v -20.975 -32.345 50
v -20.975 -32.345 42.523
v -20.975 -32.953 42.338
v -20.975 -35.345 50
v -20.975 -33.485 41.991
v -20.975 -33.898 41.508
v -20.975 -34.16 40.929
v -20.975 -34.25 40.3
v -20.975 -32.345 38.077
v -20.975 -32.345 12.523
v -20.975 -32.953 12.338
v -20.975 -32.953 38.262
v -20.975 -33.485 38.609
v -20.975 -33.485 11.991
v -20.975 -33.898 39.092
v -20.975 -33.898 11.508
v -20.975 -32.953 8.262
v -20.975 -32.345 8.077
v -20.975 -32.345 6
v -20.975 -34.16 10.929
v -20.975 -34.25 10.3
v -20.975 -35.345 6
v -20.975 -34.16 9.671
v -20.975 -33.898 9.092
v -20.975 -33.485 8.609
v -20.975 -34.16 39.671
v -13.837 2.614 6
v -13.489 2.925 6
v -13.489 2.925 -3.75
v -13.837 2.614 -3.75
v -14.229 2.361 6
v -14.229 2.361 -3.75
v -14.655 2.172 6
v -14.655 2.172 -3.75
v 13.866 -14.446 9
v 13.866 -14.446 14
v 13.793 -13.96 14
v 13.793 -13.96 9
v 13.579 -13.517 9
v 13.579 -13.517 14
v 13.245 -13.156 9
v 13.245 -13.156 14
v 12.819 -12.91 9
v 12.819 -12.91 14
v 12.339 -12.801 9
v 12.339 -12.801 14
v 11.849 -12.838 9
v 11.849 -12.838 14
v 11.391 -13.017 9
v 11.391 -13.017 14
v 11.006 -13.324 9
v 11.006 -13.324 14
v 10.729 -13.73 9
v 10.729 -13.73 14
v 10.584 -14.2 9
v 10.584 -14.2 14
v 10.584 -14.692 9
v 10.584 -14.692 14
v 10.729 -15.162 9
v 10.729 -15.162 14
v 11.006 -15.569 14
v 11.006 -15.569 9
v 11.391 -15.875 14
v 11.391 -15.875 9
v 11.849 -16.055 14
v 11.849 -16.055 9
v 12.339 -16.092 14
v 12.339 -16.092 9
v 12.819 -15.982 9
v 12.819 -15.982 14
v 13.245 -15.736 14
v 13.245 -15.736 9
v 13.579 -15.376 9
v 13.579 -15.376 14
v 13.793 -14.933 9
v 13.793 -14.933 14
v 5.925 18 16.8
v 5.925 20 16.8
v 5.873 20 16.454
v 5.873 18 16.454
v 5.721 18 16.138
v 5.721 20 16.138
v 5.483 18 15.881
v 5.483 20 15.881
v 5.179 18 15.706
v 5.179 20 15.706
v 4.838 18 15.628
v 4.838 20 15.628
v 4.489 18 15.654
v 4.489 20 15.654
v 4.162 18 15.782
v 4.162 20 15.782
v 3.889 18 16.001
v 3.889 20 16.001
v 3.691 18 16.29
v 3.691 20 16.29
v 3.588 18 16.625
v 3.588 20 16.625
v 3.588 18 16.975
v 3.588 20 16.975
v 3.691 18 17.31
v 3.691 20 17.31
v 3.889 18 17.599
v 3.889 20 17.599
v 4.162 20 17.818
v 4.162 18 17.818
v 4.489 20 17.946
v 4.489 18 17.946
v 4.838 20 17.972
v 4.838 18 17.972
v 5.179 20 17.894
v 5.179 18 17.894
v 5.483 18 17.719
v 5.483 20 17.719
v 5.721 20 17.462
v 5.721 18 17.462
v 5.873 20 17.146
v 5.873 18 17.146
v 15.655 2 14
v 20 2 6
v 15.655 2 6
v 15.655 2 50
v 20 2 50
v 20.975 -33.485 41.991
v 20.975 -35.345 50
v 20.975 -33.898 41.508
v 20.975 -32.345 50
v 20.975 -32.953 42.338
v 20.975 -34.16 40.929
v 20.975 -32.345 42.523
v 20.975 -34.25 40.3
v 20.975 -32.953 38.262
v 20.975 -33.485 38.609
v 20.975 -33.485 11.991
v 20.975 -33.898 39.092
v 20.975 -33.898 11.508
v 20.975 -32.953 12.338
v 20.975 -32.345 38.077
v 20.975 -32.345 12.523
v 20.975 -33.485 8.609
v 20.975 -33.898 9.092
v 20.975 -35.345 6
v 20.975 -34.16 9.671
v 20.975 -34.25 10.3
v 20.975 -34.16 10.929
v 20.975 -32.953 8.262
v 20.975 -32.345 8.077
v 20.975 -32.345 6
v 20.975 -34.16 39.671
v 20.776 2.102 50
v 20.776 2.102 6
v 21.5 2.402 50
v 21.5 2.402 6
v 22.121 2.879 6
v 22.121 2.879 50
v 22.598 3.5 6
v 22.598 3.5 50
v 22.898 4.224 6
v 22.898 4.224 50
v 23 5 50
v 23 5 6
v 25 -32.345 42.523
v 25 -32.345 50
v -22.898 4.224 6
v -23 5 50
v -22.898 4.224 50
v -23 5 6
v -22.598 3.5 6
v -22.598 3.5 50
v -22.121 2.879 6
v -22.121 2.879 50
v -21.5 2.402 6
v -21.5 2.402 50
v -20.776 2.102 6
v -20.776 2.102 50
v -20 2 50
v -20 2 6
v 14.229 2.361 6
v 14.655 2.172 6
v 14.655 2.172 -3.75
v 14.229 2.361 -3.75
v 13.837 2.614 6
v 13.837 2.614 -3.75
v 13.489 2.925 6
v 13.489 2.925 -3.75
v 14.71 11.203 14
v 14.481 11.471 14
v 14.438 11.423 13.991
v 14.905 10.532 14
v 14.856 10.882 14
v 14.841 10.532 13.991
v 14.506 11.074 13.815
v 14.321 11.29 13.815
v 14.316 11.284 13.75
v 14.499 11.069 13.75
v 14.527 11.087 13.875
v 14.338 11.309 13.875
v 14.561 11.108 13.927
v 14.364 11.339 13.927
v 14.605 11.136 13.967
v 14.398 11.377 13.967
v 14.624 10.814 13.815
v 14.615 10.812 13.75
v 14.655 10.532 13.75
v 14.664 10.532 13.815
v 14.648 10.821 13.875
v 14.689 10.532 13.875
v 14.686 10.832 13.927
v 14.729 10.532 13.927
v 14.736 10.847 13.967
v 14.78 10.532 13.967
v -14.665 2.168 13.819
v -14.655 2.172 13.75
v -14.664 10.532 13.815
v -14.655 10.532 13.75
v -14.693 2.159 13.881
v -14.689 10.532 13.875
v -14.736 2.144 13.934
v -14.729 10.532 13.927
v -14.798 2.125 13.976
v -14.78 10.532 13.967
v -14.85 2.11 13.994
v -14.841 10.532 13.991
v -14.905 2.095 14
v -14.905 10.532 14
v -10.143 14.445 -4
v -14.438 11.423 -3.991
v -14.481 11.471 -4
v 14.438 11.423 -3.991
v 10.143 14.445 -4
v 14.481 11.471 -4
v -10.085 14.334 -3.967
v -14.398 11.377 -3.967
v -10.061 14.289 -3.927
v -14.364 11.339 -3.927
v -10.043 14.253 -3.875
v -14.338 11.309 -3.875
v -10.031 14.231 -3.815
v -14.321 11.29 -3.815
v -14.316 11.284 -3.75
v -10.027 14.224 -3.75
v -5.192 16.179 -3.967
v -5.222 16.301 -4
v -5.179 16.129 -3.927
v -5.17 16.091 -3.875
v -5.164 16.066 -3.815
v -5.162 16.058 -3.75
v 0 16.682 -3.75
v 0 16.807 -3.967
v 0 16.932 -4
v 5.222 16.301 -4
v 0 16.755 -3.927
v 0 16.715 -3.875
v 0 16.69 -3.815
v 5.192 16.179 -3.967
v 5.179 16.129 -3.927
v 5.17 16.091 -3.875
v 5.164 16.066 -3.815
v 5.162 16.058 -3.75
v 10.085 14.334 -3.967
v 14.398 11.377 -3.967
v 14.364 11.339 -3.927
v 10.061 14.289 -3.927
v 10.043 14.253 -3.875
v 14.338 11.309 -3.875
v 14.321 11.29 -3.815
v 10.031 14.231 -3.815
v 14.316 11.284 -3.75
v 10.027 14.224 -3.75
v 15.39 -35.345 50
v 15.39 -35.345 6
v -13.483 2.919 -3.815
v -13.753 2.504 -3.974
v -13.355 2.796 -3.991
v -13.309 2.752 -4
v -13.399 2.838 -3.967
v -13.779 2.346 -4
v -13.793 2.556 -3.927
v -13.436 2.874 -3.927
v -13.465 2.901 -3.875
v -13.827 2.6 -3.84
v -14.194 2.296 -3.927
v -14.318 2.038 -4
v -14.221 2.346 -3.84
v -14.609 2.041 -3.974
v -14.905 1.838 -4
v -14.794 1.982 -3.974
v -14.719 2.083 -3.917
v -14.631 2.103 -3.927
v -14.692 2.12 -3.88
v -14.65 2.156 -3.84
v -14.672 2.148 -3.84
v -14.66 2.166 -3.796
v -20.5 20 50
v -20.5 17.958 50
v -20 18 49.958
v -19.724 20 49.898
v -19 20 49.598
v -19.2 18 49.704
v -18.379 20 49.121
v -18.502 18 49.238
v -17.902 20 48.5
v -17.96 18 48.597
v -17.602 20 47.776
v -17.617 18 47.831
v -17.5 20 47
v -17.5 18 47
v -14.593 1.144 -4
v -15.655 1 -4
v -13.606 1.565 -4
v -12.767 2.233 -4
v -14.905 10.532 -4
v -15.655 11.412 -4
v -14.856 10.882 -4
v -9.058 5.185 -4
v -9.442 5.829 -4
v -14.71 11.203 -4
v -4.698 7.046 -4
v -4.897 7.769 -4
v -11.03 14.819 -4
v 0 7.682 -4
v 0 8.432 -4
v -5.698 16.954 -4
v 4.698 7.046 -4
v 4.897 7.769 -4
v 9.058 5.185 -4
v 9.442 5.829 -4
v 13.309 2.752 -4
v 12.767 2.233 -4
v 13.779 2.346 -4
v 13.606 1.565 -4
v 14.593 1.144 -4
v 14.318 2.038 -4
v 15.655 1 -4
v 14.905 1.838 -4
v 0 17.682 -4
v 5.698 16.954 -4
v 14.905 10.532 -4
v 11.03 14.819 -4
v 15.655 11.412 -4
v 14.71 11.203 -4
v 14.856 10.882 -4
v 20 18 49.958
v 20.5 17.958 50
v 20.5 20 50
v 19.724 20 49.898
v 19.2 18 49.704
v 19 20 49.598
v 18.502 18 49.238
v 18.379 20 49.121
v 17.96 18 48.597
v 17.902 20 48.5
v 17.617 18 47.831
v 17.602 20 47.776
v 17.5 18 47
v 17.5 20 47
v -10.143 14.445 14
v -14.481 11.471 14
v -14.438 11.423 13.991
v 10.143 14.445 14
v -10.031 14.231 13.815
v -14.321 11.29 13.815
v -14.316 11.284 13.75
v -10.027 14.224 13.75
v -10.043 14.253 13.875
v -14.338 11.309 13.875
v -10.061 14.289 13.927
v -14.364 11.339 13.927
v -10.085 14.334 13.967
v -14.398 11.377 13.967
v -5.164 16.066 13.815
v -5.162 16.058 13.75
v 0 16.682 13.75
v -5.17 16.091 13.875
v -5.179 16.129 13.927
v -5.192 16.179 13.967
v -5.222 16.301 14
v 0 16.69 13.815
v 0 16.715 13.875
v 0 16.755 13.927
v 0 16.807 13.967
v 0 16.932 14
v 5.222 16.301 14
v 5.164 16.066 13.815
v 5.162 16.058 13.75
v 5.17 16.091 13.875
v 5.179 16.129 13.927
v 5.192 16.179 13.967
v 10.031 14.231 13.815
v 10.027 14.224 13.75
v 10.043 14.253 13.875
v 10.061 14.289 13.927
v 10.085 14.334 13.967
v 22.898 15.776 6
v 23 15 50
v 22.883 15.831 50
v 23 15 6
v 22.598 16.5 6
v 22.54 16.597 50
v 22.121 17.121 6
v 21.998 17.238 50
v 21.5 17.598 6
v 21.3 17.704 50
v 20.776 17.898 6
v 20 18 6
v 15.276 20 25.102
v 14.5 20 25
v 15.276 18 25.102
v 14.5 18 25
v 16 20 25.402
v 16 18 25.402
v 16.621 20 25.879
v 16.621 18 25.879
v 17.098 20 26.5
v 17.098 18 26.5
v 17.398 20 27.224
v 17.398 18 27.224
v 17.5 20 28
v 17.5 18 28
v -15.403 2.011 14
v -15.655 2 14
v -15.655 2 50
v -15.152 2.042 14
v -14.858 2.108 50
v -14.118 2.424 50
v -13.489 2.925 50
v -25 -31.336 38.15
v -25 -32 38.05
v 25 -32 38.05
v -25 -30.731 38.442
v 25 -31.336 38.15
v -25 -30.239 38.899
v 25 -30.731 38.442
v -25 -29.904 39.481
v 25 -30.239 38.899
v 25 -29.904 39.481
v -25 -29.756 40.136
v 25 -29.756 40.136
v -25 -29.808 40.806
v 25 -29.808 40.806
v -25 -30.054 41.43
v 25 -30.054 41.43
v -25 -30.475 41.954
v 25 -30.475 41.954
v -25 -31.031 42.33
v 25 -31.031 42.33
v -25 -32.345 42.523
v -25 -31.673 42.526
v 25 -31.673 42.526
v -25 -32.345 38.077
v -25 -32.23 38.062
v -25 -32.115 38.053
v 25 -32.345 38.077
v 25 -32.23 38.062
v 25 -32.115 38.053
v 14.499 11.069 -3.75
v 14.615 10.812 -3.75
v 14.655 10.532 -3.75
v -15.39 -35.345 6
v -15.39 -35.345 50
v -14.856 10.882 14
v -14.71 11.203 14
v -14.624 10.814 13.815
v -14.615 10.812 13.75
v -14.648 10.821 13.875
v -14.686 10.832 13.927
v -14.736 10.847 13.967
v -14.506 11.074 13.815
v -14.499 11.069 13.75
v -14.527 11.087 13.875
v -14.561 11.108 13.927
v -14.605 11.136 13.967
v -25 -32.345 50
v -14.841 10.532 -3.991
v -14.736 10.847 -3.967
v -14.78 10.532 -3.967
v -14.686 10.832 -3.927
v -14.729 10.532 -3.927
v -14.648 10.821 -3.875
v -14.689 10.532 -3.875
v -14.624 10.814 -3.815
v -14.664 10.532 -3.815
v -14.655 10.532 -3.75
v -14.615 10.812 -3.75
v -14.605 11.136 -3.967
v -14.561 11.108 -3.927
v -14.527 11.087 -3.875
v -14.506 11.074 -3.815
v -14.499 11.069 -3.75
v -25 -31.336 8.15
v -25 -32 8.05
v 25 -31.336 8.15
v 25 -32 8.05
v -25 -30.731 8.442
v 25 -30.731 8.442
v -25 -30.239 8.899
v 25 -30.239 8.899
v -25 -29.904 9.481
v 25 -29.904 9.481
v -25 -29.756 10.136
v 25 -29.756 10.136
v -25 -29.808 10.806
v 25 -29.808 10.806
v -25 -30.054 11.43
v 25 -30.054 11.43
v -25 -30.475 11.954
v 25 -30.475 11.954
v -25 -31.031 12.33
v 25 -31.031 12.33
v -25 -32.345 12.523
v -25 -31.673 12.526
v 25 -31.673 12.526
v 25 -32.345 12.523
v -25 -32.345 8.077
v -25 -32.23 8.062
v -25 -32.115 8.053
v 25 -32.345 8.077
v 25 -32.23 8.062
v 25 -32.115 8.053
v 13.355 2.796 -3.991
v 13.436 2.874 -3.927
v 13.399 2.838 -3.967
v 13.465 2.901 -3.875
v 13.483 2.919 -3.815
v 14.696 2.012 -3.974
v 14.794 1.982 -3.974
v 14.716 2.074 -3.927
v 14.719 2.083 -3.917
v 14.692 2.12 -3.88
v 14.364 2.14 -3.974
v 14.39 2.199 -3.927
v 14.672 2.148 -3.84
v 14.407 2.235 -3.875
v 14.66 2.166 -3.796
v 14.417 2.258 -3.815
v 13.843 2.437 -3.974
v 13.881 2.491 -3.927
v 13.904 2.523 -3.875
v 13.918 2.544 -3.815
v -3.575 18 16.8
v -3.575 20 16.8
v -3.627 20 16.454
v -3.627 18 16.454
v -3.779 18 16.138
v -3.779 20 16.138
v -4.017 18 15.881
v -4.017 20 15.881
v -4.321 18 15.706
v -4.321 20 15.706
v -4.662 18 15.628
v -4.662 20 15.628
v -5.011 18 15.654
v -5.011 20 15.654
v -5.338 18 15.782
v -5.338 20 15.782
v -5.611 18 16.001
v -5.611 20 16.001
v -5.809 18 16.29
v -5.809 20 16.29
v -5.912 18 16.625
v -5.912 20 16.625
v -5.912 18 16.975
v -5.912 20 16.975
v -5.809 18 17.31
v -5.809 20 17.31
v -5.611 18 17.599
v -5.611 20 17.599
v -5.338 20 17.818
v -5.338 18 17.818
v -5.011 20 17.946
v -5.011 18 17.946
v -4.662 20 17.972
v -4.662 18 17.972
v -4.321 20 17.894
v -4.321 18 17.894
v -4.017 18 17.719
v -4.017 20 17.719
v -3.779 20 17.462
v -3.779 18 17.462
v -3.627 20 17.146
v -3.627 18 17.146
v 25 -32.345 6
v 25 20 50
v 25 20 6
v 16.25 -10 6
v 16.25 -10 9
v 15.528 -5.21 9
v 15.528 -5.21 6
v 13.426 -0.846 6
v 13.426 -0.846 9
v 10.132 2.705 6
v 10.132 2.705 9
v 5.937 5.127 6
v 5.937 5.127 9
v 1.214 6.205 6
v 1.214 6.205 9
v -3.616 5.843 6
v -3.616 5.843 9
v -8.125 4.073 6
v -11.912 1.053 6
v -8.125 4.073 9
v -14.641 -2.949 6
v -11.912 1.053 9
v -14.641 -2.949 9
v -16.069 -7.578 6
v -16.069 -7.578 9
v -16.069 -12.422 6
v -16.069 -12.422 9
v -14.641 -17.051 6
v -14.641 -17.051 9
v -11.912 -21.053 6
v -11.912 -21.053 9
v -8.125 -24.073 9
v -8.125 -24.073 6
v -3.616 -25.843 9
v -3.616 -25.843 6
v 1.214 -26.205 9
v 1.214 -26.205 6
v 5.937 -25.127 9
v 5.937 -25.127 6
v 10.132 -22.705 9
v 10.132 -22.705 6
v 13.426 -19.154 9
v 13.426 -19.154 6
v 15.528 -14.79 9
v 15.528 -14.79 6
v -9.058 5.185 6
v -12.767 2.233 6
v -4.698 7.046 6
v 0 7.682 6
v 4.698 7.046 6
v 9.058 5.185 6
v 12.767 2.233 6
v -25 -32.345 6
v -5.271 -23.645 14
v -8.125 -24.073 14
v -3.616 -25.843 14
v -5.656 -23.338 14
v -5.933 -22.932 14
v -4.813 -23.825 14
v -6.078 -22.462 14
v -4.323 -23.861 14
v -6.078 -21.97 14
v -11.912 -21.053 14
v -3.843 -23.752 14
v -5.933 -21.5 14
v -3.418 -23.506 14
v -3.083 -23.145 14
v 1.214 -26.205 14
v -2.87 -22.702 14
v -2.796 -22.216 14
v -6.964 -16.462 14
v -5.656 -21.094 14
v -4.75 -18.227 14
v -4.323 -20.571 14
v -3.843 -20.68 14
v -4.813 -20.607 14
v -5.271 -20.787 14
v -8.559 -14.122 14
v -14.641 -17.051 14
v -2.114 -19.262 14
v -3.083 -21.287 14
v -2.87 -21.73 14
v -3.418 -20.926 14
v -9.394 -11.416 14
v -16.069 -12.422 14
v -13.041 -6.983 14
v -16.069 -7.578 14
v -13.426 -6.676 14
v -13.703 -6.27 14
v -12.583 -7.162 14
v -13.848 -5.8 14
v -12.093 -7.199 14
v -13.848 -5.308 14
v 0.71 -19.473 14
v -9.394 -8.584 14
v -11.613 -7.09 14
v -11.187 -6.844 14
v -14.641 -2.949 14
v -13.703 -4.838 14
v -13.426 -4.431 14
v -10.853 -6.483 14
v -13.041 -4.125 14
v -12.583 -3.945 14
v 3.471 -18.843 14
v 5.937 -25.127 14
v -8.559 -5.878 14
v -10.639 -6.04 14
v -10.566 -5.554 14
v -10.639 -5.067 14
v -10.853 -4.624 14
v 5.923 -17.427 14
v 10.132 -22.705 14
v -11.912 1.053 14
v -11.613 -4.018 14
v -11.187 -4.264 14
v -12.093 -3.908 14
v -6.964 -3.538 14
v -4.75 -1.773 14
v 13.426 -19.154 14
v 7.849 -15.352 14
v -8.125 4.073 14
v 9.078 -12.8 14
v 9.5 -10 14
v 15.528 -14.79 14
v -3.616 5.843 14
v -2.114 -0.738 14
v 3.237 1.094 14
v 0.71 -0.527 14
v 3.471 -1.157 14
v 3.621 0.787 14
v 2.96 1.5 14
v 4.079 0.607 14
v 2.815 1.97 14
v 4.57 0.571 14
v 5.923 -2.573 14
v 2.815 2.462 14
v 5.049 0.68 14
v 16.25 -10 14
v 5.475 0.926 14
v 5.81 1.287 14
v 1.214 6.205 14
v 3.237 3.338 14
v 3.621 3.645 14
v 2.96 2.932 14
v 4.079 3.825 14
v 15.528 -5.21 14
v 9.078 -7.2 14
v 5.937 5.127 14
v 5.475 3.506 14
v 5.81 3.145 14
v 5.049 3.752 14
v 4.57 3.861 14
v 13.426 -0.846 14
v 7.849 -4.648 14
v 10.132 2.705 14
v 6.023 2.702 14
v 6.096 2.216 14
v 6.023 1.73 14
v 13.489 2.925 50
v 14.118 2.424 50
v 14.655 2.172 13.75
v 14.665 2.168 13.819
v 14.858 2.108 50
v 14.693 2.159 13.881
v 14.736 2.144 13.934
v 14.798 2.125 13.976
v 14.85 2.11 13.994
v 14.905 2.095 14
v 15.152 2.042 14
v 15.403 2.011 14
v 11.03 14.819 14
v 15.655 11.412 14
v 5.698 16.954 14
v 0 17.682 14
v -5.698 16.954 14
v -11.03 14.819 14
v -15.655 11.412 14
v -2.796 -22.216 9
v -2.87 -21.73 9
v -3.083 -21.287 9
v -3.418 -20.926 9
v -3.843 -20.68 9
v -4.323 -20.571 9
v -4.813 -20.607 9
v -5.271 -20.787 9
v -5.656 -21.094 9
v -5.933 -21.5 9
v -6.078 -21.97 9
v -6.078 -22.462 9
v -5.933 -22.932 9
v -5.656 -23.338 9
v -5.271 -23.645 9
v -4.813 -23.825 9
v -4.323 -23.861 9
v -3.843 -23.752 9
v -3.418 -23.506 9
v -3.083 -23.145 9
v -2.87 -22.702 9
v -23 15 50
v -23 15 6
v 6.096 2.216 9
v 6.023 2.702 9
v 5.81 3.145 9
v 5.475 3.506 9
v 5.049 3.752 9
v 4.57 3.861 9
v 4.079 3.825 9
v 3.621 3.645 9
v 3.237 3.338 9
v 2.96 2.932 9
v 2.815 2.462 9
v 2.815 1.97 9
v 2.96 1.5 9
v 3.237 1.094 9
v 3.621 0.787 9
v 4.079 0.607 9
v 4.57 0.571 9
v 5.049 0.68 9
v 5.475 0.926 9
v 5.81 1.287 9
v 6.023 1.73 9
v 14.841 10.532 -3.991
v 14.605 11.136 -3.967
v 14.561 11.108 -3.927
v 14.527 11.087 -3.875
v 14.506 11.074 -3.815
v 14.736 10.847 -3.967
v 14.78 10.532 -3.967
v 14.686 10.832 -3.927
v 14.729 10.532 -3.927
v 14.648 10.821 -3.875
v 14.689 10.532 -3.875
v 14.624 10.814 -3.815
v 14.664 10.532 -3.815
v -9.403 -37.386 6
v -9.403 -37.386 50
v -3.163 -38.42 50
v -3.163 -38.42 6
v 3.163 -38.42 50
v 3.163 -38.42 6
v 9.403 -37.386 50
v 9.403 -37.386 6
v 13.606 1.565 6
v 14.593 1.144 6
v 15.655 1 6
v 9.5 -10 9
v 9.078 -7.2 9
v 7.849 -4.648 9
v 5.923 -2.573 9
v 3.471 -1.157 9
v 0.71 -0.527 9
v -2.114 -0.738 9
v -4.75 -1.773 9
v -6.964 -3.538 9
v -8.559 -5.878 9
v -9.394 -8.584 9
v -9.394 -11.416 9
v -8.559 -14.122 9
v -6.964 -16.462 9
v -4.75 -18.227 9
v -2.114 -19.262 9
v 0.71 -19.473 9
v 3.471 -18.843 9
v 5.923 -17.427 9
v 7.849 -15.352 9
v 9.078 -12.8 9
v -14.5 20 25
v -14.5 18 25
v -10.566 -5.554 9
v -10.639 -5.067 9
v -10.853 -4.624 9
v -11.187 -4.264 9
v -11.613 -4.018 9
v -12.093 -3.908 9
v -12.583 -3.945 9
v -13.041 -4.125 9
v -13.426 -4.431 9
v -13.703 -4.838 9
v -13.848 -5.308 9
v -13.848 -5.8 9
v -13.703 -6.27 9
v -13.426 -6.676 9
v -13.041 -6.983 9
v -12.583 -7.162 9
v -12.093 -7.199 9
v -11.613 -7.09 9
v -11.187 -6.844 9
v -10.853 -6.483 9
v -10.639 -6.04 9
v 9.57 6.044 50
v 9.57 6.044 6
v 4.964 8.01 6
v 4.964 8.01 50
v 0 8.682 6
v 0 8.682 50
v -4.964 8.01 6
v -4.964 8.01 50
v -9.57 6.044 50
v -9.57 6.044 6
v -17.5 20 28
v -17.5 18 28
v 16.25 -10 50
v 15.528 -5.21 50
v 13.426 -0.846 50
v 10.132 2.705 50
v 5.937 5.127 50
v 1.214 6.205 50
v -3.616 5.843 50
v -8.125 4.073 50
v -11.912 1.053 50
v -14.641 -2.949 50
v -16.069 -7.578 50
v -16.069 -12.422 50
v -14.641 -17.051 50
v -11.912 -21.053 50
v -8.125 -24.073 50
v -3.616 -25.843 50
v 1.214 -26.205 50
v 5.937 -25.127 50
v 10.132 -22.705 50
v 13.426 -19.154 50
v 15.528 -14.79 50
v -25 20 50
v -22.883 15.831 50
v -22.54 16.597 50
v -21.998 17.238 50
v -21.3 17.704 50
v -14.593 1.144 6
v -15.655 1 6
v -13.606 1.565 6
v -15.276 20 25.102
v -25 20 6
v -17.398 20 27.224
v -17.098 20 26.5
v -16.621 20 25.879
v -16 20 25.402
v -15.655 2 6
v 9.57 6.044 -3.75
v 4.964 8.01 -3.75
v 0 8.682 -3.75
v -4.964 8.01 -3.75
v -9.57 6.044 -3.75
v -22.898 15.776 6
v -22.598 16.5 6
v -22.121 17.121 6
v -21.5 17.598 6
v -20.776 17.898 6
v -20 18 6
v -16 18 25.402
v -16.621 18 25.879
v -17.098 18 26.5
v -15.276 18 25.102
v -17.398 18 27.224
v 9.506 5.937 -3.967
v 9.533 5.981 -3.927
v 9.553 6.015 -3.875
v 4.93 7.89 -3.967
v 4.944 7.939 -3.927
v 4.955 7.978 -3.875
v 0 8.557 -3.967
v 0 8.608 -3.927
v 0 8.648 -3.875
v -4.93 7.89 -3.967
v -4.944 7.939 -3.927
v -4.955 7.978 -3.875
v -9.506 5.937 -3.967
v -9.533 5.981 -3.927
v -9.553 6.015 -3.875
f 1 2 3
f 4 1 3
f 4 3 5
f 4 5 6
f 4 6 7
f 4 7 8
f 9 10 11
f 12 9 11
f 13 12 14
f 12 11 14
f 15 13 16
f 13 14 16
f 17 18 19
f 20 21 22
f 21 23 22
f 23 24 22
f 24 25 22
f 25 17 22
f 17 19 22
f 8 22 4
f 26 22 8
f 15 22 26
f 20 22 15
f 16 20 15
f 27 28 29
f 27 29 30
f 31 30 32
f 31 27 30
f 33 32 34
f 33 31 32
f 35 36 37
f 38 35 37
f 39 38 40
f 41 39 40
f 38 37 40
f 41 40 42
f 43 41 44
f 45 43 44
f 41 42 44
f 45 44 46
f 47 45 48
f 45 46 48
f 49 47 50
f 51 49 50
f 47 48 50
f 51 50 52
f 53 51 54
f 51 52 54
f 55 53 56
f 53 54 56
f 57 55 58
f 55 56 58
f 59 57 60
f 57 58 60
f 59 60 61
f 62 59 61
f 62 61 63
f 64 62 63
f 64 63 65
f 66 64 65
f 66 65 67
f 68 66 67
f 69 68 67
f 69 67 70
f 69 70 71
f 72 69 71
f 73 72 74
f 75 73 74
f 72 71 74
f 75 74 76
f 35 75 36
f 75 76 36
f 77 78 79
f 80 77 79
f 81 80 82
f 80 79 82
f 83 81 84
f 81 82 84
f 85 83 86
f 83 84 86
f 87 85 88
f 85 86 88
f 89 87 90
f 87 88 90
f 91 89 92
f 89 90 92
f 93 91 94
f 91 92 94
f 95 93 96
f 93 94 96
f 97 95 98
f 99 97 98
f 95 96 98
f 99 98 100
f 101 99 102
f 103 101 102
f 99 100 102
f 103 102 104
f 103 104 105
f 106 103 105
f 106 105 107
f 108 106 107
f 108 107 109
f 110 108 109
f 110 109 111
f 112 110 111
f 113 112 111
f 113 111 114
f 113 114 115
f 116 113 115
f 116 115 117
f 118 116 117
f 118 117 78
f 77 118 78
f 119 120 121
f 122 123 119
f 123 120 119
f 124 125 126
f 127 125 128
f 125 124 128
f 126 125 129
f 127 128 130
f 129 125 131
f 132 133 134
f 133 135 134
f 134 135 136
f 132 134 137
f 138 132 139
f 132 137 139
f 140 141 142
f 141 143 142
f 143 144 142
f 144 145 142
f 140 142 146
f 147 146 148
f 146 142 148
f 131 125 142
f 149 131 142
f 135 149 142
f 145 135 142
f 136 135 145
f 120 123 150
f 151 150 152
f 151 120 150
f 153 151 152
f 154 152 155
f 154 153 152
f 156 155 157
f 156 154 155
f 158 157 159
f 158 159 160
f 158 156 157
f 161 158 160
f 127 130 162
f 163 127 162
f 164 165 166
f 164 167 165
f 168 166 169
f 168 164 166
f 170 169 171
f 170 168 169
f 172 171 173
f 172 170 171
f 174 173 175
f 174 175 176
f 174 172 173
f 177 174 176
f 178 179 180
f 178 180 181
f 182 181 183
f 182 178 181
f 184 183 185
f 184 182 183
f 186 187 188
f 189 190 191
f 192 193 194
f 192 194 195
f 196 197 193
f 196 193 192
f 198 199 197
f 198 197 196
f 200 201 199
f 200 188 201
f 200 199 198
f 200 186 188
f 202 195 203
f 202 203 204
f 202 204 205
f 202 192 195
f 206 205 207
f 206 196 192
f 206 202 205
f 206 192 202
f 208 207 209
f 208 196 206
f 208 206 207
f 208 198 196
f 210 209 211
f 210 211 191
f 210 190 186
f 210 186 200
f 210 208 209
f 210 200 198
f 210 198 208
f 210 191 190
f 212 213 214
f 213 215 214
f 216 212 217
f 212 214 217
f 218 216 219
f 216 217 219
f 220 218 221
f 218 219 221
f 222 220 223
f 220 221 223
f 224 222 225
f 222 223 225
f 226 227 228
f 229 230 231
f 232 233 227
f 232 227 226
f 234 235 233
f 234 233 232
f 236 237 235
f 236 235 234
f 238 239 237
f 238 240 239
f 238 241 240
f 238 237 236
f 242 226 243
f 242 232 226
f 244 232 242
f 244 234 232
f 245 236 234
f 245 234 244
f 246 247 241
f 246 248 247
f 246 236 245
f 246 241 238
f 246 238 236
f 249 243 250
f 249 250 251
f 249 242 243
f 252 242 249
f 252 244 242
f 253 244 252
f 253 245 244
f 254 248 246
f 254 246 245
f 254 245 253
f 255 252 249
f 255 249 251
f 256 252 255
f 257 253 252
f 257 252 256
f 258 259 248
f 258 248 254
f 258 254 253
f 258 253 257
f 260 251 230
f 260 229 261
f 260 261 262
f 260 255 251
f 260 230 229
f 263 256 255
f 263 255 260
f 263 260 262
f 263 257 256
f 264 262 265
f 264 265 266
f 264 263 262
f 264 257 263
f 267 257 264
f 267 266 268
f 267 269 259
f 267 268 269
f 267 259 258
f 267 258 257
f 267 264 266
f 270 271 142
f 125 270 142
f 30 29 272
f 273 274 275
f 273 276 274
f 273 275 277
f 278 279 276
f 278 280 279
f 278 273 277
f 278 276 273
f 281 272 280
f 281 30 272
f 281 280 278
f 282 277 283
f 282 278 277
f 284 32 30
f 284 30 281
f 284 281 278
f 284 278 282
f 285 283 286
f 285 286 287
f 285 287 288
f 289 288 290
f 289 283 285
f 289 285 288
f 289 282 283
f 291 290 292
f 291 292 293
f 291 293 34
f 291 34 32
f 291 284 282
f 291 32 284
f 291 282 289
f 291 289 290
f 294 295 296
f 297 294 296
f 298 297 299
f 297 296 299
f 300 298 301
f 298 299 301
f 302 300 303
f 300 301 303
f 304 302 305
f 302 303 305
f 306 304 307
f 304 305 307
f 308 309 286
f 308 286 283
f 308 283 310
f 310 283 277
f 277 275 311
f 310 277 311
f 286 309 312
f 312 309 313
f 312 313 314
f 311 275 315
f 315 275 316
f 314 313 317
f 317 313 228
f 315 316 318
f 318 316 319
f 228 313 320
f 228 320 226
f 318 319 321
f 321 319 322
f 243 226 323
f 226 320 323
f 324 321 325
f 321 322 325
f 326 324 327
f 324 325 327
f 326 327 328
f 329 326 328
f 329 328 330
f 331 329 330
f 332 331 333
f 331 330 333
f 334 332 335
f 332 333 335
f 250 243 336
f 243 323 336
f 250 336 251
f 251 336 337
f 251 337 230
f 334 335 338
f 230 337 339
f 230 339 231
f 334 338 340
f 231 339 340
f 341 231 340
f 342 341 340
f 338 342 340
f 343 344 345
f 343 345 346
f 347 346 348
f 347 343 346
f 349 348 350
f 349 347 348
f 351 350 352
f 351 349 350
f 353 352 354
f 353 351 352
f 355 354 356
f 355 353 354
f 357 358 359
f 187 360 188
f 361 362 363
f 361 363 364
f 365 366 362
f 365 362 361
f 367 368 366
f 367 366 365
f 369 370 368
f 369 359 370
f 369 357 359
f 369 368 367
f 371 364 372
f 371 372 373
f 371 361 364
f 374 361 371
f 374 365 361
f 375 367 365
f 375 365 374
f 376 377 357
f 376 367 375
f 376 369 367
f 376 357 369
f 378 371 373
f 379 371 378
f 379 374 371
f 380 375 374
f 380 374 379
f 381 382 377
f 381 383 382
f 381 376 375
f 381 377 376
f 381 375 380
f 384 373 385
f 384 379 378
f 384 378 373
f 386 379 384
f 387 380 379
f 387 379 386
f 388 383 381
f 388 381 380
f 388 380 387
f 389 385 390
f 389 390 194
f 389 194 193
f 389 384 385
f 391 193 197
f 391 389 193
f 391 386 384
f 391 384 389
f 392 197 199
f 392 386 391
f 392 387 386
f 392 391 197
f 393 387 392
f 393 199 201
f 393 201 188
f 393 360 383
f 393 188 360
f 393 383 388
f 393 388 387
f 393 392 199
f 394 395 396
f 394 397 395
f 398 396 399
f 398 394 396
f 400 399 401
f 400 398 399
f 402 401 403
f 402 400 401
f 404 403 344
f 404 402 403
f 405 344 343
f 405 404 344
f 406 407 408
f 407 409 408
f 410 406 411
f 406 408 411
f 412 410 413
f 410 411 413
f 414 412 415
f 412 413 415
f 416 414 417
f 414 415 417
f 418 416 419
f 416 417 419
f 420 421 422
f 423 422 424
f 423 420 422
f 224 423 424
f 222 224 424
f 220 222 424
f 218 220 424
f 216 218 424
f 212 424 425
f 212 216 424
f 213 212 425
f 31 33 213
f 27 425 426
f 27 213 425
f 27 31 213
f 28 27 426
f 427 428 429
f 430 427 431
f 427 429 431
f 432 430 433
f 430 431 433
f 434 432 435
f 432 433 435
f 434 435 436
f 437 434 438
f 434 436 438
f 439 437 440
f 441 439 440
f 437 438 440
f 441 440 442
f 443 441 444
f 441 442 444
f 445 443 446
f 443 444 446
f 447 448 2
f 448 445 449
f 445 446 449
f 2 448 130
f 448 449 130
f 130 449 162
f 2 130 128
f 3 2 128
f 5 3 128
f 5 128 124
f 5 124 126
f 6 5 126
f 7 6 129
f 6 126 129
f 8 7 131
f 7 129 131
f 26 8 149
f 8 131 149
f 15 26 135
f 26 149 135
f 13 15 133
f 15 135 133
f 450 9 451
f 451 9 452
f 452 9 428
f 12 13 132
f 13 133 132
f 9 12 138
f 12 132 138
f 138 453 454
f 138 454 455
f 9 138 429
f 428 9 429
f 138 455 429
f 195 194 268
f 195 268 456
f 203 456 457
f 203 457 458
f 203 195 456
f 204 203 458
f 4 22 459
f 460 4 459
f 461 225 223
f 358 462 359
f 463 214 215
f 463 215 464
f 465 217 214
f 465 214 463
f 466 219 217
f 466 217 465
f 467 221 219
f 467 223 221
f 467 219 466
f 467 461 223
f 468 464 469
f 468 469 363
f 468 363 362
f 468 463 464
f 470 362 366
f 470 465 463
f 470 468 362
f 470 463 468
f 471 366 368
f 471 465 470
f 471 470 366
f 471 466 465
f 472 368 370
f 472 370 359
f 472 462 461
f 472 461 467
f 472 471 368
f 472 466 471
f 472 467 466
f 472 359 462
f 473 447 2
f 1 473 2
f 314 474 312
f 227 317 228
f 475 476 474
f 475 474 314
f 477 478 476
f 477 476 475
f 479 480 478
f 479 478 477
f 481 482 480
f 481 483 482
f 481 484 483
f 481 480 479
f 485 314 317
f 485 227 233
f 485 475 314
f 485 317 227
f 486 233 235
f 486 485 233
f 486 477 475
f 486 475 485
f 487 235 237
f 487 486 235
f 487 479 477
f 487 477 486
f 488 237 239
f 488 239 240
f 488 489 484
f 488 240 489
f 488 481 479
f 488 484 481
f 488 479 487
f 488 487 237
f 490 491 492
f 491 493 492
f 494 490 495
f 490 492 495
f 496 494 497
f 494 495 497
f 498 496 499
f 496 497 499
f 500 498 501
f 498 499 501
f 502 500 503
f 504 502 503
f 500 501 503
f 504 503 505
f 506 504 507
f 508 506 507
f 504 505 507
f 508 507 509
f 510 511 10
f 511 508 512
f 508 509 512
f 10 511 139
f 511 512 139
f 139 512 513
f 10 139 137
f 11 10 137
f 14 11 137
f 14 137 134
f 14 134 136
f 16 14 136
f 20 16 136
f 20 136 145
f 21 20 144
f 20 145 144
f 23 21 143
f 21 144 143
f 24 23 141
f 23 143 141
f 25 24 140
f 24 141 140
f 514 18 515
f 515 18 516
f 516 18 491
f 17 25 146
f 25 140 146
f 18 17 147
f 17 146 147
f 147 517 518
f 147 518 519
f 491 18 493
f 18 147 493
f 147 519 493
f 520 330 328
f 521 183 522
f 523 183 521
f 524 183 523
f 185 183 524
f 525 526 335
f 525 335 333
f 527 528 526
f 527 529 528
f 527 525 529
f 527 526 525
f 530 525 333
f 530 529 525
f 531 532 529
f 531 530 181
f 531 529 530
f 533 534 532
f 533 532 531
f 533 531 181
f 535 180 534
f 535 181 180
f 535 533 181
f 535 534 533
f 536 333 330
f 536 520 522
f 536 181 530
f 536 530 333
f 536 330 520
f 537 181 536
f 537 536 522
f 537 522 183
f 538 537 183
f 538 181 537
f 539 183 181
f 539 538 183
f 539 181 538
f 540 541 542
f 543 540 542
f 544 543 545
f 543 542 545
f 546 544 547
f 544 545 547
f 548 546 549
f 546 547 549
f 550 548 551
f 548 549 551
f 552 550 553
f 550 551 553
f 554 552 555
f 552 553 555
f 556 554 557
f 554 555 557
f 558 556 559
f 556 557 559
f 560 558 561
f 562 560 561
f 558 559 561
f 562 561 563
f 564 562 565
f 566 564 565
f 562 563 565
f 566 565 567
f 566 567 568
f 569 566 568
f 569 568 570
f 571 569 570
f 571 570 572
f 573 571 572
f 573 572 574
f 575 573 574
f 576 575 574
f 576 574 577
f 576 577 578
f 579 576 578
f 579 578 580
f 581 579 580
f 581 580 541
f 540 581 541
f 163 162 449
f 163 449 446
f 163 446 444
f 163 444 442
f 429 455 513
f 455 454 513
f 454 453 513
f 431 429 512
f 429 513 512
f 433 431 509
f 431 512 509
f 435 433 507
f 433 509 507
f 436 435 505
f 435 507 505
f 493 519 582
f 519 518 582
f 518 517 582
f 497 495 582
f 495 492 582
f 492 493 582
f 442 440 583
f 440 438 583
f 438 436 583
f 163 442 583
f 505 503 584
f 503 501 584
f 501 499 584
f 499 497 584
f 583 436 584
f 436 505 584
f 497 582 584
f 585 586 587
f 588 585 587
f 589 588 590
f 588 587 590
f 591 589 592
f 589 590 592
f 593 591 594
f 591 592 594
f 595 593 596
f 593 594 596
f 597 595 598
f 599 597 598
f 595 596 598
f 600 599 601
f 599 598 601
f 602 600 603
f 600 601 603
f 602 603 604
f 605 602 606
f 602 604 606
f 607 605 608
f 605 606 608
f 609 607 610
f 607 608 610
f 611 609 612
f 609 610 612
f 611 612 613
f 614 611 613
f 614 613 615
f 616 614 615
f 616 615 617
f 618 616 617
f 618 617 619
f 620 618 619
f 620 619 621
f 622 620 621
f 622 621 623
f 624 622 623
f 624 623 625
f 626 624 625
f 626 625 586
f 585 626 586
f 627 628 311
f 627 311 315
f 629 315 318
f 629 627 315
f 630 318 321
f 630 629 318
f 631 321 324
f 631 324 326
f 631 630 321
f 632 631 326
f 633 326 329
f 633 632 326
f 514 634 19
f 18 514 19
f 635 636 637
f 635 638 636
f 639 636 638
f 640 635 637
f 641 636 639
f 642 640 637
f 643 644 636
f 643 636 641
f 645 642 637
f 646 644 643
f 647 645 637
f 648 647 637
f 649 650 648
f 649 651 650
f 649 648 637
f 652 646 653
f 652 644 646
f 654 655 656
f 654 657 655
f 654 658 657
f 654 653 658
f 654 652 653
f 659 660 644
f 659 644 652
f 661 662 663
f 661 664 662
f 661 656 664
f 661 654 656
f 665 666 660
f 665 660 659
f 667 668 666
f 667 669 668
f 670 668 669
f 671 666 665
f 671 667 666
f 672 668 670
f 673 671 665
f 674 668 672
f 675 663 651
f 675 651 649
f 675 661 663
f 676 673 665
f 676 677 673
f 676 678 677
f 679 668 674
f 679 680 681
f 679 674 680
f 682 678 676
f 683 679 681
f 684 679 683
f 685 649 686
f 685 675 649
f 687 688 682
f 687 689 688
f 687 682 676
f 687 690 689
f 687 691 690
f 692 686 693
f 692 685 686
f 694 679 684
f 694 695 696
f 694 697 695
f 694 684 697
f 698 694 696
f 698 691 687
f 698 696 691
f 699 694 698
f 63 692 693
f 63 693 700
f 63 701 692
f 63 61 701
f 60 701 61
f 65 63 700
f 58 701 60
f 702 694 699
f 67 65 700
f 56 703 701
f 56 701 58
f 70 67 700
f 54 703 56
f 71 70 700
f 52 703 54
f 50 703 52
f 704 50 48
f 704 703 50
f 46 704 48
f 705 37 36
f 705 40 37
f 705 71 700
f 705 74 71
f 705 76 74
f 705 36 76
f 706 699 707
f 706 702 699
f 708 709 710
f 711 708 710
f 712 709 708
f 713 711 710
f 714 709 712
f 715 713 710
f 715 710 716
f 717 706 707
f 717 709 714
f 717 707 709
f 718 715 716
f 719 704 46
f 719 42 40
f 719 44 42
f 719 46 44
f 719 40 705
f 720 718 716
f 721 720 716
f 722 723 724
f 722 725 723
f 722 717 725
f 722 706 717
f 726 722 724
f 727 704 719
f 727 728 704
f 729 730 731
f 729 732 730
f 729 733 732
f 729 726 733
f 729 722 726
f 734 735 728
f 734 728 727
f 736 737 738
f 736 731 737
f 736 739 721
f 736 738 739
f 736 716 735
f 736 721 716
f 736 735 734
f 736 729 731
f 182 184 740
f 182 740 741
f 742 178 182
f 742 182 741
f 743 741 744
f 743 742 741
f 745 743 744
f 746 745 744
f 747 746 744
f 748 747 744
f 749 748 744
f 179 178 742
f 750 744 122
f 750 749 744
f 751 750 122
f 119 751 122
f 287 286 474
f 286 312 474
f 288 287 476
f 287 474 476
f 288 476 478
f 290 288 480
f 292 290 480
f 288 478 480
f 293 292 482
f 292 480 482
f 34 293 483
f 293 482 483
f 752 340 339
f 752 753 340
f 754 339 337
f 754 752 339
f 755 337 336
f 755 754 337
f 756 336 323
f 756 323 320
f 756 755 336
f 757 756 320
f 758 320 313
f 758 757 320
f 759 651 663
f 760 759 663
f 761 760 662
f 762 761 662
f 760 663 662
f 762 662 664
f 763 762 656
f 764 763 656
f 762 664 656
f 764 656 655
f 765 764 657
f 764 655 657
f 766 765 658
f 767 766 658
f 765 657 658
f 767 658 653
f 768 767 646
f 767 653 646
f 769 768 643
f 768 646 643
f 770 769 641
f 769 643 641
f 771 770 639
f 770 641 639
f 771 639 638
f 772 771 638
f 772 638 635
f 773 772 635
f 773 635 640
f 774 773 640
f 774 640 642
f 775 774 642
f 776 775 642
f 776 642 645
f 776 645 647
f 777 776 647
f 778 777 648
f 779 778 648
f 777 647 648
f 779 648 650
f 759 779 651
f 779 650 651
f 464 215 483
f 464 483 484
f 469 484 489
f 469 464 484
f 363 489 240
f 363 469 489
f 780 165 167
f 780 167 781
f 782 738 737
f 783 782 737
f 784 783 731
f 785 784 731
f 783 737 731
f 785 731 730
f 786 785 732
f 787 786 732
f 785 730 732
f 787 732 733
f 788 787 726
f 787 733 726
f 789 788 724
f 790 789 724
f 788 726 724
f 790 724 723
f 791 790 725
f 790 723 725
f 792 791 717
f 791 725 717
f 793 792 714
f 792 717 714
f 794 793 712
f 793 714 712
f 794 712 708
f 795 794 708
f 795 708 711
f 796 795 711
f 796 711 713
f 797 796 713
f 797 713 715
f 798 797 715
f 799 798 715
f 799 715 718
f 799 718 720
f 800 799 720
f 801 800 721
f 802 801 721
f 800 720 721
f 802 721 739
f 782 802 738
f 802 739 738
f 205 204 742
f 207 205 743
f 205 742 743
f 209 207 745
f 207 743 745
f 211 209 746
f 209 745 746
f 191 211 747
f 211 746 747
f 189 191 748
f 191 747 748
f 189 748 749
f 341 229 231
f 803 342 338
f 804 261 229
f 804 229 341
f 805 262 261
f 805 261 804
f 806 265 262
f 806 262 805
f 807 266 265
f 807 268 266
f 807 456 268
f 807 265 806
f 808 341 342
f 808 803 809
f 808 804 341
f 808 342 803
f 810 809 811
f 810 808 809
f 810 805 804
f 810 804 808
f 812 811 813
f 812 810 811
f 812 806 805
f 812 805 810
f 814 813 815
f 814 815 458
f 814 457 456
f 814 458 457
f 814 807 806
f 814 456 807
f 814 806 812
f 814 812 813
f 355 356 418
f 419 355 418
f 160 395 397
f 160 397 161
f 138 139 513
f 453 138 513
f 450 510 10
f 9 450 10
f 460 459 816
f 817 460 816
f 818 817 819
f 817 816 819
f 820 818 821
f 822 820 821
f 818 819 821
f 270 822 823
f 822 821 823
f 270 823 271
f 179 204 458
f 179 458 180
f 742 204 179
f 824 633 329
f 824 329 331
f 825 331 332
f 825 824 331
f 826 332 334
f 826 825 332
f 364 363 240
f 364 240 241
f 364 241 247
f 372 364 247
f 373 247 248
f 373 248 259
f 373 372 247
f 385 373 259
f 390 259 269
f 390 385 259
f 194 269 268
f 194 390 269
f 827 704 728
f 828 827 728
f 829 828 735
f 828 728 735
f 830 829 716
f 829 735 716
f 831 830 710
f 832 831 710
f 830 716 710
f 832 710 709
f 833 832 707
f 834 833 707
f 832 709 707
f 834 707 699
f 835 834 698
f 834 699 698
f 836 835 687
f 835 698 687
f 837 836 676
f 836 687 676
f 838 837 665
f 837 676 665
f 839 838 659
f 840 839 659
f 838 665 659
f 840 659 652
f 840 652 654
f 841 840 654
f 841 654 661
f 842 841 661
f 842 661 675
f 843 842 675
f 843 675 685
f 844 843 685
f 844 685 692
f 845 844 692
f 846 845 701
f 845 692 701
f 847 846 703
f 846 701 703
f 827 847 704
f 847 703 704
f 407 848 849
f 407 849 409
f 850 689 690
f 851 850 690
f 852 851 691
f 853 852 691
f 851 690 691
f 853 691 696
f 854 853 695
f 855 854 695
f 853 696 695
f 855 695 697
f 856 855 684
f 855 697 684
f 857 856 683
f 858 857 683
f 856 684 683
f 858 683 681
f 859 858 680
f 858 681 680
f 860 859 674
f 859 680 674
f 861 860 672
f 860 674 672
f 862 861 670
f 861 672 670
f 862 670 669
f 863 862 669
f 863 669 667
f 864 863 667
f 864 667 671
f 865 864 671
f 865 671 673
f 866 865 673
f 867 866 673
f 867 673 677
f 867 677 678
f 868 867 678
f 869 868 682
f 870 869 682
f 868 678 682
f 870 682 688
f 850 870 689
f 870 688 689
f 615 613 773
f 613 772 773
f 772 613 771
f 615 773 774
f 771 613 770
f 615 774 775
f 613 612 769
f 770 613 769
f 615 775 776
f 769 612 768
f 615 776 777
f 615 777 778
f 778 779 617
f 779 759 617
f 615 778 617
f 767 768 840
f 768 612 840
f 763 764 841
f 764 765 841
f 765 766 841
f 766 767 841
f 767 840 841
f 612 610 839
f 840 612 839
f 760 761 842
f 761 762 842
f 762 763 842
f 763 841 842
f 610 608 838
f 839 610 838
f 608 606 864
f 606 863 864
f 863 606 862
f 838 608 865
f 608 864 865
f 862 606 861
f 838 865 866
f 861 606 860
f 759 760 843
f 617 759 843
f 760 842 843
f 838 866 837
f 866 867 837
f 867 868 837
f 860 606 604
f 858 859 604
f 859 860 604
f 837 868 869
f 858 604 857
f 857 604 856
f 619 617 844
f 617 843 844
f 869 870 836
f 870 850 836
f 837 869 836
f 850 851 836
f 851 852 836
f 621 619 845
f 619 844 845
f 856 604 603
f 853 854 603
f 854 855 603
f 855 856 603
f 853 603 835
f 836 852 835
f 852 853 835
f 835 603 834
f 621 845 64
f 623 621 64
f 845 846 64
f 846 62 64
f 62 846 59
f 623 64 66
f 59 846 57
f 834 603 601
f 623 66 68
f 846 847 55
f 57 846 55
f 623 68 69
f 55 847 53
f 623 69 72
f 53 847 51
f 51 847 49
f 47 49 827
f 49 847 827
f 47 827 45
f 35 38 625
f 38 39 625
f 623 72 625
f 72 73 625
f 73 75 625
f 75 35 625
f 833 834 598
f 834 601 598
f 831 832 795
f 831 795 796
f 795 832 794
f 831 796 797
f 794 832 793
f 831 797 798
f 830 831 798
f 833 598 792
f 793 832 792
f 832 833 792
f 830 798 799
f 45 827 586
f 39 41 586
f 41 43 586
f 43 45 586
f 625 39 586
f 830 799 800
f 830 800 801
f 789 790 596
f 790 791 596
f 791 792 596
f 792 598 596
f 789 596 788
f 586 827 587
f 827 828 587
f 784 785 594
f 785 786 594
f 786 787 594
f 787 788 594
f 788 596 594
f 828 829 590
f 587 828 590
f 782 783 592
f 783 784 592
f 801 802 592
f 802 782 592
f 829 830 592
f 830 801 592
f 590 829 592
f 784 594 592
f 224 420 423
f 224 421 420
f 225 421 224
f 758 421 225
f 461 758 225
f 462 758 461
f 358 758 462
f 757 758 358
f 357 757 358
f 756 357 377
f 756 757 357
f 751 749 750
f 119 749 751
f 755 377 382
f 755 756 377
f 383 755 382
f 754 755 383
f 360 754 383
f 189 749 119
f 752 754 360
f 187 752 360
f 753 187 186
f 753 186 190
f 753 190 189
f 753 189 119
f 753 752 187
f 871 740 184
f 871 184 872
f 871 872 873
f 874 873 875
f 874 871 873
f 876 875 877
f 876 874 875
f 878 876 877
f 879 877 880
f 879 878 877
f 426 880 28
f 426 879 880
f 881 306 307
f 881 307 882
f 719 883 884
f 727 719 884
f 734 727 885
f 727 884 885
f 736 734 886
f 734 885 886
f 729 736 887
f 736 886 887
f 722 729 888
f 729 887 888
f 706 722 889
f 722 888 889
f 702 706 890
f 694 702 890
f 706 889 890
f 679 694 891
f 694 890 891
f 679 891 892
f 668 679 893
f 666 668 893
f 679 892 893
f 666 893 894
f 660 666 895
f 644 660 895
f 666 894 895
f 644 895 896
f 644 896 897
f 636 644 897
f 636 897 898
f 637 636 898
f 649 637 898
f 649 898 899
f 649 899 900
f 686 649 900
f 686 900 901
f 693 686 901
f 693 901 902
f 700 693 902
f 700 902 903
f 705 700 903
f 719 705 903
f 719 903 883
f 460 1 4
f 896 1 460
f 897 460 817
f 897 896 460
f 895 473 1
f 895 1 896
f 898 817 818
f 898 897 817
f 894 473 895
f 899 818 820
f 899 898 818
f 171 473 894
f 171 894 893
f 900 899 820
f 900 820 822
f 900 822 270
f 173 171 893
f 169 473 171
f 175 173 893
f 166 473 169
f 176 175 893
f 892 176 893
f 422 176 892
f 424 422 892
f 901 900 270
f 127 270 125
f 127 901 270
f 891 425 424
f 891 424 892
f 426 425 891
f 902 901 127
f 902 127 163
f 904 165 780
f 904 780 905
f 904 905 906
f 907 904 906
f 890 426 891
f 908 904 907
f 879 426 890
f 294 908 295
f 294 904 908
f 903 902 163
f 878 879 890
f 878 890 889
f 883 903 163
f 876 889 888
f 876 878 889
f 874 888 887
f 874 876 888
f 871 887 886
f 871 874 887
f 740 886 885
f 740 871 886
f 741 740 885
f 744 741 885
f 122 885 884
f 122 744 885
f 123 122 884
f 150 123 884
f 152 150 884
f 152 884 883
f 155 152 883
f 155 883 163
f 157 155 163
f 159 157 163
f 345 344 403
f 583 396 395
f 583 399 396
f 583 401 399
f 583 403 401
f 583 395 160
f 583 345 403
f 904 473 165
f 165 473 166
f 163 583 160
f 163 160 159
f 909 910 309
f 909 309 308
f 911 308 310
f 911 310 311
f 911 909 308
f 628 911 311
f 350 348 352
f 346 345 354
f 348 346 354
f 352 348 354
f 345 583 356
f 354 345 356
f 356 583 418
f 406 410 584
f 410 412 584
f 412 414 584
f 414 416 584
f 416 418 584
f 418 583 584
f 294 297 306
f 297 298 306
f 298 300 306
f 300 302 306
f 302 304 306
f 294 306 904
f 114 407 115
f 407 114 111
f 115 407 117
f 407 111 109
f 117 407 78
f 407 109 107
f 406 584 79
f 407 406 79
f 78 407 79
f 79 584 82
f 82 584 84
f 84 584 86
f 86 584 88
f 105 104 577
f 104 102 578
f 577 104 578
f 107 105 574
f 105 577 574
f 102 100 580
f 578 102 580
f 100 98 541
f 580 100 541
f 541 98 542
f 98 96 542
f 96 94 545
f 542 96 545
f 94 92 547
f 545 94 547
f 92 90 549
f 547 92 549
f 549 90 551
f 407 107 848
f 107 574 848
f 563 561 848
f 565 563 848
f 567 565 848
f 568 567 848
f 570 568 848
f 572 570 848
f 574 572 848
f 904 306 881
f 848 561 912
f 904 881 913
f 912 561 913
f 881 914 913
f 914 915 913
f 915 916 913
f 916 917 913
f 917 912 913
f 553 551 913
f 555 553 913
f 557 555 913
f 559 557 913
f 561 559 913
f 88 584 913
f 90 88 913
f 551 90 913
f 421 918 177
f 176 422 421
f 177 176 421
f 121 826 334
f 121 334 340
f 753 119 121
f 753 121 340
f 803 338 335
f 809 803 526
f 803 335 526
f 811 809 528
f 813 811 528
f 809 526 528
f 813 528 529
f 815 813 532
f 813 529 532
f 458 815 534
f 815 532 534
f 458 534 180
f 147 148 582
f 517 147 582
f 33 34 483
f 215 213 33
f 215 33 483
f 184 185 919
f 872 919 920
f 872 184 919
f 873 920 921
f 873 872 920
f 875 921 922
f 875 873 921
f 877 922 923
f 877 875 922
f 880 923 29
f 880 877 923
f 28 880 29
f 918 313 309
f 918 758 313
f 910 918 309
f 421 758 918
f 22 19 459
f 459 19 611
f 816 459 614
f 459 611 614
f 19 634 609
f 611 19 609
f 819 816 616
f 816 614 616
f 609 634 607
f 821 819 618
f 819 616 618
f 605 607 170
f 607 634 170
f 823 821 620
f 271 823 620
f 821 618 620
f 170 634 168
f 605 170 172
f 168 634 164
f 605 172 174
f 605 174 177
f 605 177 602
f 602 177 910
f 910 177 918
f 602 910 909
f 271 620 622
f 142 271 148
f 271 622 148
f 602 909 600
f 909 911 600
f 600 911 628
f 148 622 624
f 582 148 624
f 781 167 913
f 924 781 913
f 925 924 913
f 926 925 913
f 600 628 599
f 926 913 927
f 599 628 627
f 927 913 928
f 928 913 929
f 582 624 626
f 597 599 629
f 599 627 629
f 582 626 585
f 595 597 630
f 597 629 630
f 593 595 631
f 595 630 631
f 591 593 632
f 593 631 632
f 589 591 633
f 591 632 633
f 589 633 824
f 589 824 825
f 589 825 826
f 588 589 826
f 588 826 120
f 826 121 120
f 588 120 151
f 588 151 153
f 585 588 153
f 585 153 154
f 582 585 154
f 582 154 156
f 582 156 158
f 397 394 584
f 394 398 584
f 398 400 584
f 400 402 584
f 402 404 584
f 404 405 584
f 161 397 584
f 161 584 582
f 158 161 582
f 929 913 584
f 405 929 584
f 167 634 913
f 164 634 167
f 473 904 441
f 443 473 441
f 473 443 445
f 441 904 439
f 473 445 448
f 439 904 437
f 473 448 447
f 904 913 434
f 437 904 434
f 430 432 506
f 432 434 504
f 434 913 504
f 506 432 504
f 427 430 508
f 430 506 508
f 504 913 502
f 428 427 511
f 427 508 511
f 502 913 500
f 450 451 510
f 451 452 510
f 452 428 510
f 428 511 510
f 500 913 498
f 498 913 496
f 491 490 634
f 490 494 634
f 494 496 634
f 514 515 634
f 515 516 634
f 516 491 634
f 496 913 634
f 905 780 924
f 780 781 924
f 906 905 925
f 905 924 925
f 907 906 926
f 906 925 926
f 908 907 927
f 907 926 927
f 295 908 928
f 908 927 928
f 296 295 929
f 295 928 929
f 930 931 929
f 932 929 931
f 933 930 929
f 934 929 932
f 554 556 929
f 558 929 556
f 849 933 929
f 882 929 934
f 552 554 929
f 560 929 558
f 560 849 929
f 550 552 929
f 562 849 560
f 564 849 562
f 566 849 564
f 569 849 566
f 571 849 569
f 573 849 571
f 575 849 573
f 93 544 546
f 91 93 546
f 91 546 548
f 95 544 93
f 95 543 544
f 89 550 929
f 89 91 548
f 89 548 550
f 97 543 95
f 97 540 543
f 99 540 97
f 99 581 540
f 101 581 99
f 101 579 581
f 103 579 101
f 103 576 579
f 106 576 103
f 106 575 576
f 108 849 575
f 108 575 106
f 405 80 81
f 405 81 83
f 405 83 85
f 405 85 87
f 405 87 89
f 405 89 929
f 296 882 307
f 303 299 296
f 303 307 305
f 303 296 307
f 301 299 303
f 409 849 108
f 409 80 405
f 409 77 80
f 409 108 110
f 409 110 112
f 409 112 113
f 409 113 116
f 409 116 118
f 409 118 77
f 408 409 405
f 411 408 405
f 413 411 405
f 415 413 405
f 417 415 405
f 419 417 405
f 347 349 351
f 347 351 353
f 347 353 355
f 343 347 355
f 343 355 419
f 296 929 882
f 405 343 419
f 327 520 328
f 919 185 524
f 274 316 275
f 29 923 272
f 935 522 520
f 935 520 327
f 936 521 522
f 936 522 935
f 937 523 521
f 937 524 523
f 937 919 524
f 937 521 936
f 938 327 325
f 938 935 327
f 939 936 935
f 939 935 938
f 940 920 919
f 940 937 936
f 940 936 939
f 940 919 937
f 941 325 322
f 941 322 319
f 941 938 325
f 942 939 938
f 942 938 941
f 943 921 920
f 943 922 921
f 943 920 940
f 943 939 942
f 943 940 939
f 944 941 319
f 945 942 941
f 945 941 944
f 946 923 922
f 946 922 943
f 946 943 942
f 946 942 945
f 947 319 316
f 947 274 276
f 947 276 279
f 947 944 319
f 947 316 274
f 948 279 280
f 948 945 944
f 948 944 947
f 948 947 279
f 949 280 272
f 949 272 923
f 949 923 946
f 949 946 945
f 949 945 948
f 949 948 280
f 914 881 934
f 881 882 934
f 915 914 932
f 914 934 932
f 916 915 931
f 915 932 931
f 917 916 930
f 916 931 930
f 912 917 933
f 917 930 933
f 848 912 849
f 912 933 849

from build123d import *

# Parameters (mm, degrees)
BOSS_EXTRUDE2_START      = 6
BOSS_EXTRUDE2_DEPTH      = 44
SKETCH2_R                = 16.25
CUT_EXTRUDE1_DEPTH       = 1
CUT_EXTRUDE1_DEPTH_BACK  = 45
CUT_EXTRUDE3_DEPTH       = 45
FILLET1_R                = 3
SKETCH5_W                = 35
SKETCH5_H                = 25
CUT_EXTRUDE4_DEPTH       = 10
FILLET2_R                = 3
SKETCH6_R                = 16.25
SKETCH6_R_2              = 9.5
SKETCH6_R_3              = 1.65
BOSS_EXTRUDE3_DEPTH      = 5
SKETCH7_R                = 2.25
CUT_EXTRUDE5_DEPTH       = 26
CUT_EXTRUDE5_DEPTH_BACK  = 26
CUT_EXTRUDE6_REACH       = 60.55
SKETCH8_R                = 1.175
BOSS_EXTRUDE4_START      = -44
BOSS_EXTRUDE4_DEPTH      = 8
BOSS_EXTRUDE4_DEPTH_BACK = 10
FILLET5_R                = 0.25
FILLET6_R                = 0.25


with BuildPart() as part:
    # Sketch1 → Boss-Extrude2 (new body)
    with BuildSketch(Plane.XY.offset(BOSS_EXTRUDE2_START)):
        with BuildLine():
            Line((-25, 0), (-25, -29.344548046))
            Line((-25, -29.344548046), (-25, -32.344548046))
            Line((-25, -32.344548046), (-20.974572981, -32.344548046))
            Line((-20.974572981, -32.344548046), (-20.974572981, -35.344548046))
            Line((-20.974572981, -35.344548046), (-15.390432855, -35.344548046))
            ThreePointArc((-15.390432855, -35.344548046), (0, -38.55), (15.390432855, -35.344548046))
            Line((15.390432855, -35.344548046), (20.974572981, -35.344548046))
            Line((20.974572981, -35.344548046), (20.974572981, -32.344548046))
            Line((20.974572981, -32.344548046), (25, -32.344548046))
            Line((25, -32.344548046), (25, -29.344548046))
            Line((25, -29.344548046), (25, 0))
            Line((25, 0), (25, 20))
            Line((25, 20), (-25, 20))
            Line((-25, 20), (-25, 0))
        make_face()
    extrude(amount=BOSS_EXTRUDE2_DEPTH)

    # Sketch2 → Cut-Extrude1 (cut, two sides)
    with BuildSketch(Plane.XY.offset(50)) as cut_extrude1_sk:
        with Locations((0, -10)):
            Circle(SKETCH2_R)
    extrude(amount=CUT_EXTRUDE1_DEPTH, mode=Mode.SUBTRACT)
    extrude(cut_extrude1_sk.sketch, amount=-CUT_EXTRUDE1_DEPTH_BACK, mode=Mode.SUBTRACT)

    # Sketch4 → Cut-Extrude3 (cut, through all)
    with BuildSketch(Plane.XY.offset(50)):
        with BuildLine():
            Line((-23, 18), (23, 18))
            Line((23, 18), (23, 2))
            Line((23, 2), (14.317821063, 2))
            ThreePointArc((14.317821063, 2), (0, 8.681541692), (-14.317821063, 2))
            Line((-14.317821063, 2), (-23, 2))
            Line((-23, 2), (-23, 18))
        make_face()
    extrude(amount=-CUT_EXTRUDE3_DEPTH, mode=Mode.SUBTRACT)

    # Fillet1
    fillet1_edges = [part.edges().sort_by_distance(p)[0] for p in [
        (23, 18, 28),
        (23, 2, 28),
        (14.317821063, 2, 28),
        (-14.317821063, 2, 28),
        (-23, 2, 28),
        (-23, 18, 28),
    ]]
    fillet(fillet1_edges, radius=FILLET1_R)

    # Sketch5 → Cut-Extrude4 (cut)
    with BuildSketch(Plane(origin=(0, 20, 0), x_dir=(1, 0, 0), z_dir=(0, 1, 0))):
        with Locations((0, -37.5)):
            Rectangle(SKETCH5_W, SKETCH5_H)
    extrude(amount=-CUT_EXTRUDE4_DEPTH, mode=Mode.SUBTRACT)

    # Fillet2
    fillet2_edges = [part.edges().sort_by_distance(p)[0] for p in [
        (17.5, 19, 50),
        (17.5, 19, 25),
        (-17.5, 19, 25),
        (-17.5, 19, 50),
    ]]
    fillet(fillet2_edges, radius=FILLET2_R)

    # Sketch6 → Boss-Extrude3 (add)
    with BuildSketch(Plane.XY.offset(14)):
        with Locations((0, -10)):
            Circle(SKETCH6_R)
        with Locations((0, -10)):
            Circle(SKETCH6_R_2, mode=Mode.SUBTRACT)
        with Locations((4.446261863, 2.21600407)):
            Circle(SKETCH6_R_3, mode=Mode.SUBTRACT)
        with Locations((12.21600407, -14.446261863)):
            Circle(SKETCH6_R_3, mode=Mode.SUBTRACT)
        with Locations((-4.446261863, -22.21600407)):
            Circle(SKETCH6_R_3, mode=Mode.SUBTRACT)
        with Locations((-12.21600407, -5.553738137)):
            Circle(SKETCH6_R_3, mode=Mode.SUBTRACT)
    extrude(amount=-BOSS_EXTRUDE3_DEPTH)

    # Sketch7 → Cut-Extrude5 (cut, two sides)
    with BuildSketch(Plane(origin=(0, 0, 0), x_dir=(0, 0, -1), z_dir=(1, 0, 0))) as cut_extrude5_sk:
        with Locations((-40.3, -32)):
            Circle(SKETCH7_R)
        with Locations((-10.3, -32)):
            Circle(SKETCH7_R)
    extrude(amount=CUT_EXTRUDE5_DEPTH, mode=Mode.SUBTRACT)
    extrude(cut_extrude5_sk.sketch, amount=-CUT_EXTRUDE5_DEPTH_BACK, mode=Mode.SUBTRACT)

    # Sketch8 → Cut-Extrude6 (cut, up to next)
    with BuildSketch(Plane(origin=(0, 20, 0), x_dir=(1, 0, 0), z_dir=(0, 1, 0)), mode=Mode.PRIVATE) as cut_extrude6_sk1:
        with Locations((-4.75, -16.8)):
            Circle(SKETCH8_R)
    cut_extrude6_tool1 = extrude(cut_extrude6_sk1.sketch, amount=-CUT_EXTRUDE6_REACH, mode=Mode.PRIVATE) & part.part
    add(cut_extrude6_tool1.solids().sort_by_distance((-4.75, 20, 16.8))[0], mode=Mode.SUBTRACT)
    # Sketch8 → Cut-Extrude6 (cut, up to next)
    with BuildSketch(Plane(origin=(0, 20, 0), x_dir=(1, 0, 0), z_dir=(0, 1, 0)), mode=Mode.PRIVATE) as cut_extrude6_sk2:
        with Locations((4.75, -16.8)):
            Circle(SKETCH8_R)
    cut_extrude6_tool2 = extrude(cut_extrude6_sk2.sketch, amount=-CUT_EXTRUDE6_REACH, mode=Mode.PRIVATE) & part.part
    add(cut_extrude6_tool2.solids().sort_by_distance((4.75, 20, 16.8))[0], mode=Mode.SUBTRACT)

    # Sketch9 → Boss-Extrude4 (add, two sides)
    with BuildSketch(Plane.XY.offset(50).offset(BOSS_EXTRUDE4_START)) as boss_extrude4_sk:
        with BuildLine():
            ThreePointArc((-14.655326574, 2.171572875), (-15.148020638, 2.043204321), (-15.655326574, 2))
            Line((-15.655326574, 2), (-15.655326574, 1))
            ThreePointArc((-15.655326574, 1), (-14.085187018, 1.32105154), (-12.767095323, 2.232669113))
            ThreePointArc((-12.767095323, 2.232669113), (0, 7.681541692), (12.767095323, 2.232669113))
            ThreePointArc((12.767095323, 2.232669113), (14.085187018, 1.32105154), (15.655326574, 1))
            Line((15.655326574, 1), (15.655326574, 2))
            ThreePointArc((15.655326574, 2), (15.148020638, 2.043204321), (14.655326574, 2.171572875))
            ThreePointArc((14.655326574, 2.171572875), (14.028093012, 2.479660552), (13.489153136, 2.924501835))
            ThreePointArc((13.489153136, 2.924501835), (0, 8.681541692), (-13.489153136, 2.924501835))
            ThreePointArc((-13.489153136, 2.924501835), (-14.028093012, 2.479660552), (-14.655326574, 2.171572875))
        make_face()
        with BuildLine():
            Line((-15.655326574, 11.412284527), (-15.655326574, 2))
            ThreePointArc((-15.655326574, 2), (-15.148020638, 2.043204321), (-14.655326574, 2.171572875))
            Line((-14.655326574, 2.171572875), (-14.655326574, 10.53248927))
            ThreePointArc((-14.655326574, 10.53248927), (-14.566443026, 10.944638287), (-14.31559295, 11.283520769))
            ThreePointArc((-14.31559295, 11.283520769), (0, 16.681541692), (14.31559295, 11.283520769))
            ThreePointArc((14.31559295, 11.283520769), (14.566443026, 10.944638287), (14.655326574, 10.53248927))
            Line((14.655326574, 10.53248927), (14.655326574, 2.171572875))
            ThreePointArc((14.655326574, 2.171572875), (15.148020638, 2.043204321), (15.655326574, 2))
            Line((15.655326574, 2), (15.655326574, 11.412284527))
            ThreePointArc((15.655326574, 11.412284527), (0, 17.681541692), (-15.655326574, 11.412284527))
        make_face()
    extrude(amount=BOSS_EXTRUDE4_DEPTH)
    extrude(boss_extrude4_sk.sketch, amount=-BOSS_EXTRUDE4_DEPTH_BACK)

    # Fillet5
    fillet5_edges = [part.edges().sort_by_distance(p)[0] for p in [
        (0, 8.681541692, -4),
        (14.566443026, 10.944638287, -4),
        (0, 16.681541692, -4),
        (-14.566443026, 10.944638287, -4),
        (-14.028093012, 2.479660552, -4),
        (14.028093012, 2.479660552, -4),
        (14.655326574, 6.352031072, -4),
        (-14.655326574, 6.352031072, -4),
    ]]
    fillet(fillet5_edges, radius=FILLET5_R)

    # Fillet6
    fillet6_edges = [part.edges().sort_by_distance(p)[0] for p in [
        (-14.655326574, 6.352031072, 14),
        (0, 16.681541692, 14),
        (14.566443026, 10.944638287, 14),
        (14.655326574, 6.352031072, 14),
        (-14.566443026, 10.944638287, 14),
    ]]
    fillet(fillet6_edges, radius=FILLET6_R)


solid = part.part
